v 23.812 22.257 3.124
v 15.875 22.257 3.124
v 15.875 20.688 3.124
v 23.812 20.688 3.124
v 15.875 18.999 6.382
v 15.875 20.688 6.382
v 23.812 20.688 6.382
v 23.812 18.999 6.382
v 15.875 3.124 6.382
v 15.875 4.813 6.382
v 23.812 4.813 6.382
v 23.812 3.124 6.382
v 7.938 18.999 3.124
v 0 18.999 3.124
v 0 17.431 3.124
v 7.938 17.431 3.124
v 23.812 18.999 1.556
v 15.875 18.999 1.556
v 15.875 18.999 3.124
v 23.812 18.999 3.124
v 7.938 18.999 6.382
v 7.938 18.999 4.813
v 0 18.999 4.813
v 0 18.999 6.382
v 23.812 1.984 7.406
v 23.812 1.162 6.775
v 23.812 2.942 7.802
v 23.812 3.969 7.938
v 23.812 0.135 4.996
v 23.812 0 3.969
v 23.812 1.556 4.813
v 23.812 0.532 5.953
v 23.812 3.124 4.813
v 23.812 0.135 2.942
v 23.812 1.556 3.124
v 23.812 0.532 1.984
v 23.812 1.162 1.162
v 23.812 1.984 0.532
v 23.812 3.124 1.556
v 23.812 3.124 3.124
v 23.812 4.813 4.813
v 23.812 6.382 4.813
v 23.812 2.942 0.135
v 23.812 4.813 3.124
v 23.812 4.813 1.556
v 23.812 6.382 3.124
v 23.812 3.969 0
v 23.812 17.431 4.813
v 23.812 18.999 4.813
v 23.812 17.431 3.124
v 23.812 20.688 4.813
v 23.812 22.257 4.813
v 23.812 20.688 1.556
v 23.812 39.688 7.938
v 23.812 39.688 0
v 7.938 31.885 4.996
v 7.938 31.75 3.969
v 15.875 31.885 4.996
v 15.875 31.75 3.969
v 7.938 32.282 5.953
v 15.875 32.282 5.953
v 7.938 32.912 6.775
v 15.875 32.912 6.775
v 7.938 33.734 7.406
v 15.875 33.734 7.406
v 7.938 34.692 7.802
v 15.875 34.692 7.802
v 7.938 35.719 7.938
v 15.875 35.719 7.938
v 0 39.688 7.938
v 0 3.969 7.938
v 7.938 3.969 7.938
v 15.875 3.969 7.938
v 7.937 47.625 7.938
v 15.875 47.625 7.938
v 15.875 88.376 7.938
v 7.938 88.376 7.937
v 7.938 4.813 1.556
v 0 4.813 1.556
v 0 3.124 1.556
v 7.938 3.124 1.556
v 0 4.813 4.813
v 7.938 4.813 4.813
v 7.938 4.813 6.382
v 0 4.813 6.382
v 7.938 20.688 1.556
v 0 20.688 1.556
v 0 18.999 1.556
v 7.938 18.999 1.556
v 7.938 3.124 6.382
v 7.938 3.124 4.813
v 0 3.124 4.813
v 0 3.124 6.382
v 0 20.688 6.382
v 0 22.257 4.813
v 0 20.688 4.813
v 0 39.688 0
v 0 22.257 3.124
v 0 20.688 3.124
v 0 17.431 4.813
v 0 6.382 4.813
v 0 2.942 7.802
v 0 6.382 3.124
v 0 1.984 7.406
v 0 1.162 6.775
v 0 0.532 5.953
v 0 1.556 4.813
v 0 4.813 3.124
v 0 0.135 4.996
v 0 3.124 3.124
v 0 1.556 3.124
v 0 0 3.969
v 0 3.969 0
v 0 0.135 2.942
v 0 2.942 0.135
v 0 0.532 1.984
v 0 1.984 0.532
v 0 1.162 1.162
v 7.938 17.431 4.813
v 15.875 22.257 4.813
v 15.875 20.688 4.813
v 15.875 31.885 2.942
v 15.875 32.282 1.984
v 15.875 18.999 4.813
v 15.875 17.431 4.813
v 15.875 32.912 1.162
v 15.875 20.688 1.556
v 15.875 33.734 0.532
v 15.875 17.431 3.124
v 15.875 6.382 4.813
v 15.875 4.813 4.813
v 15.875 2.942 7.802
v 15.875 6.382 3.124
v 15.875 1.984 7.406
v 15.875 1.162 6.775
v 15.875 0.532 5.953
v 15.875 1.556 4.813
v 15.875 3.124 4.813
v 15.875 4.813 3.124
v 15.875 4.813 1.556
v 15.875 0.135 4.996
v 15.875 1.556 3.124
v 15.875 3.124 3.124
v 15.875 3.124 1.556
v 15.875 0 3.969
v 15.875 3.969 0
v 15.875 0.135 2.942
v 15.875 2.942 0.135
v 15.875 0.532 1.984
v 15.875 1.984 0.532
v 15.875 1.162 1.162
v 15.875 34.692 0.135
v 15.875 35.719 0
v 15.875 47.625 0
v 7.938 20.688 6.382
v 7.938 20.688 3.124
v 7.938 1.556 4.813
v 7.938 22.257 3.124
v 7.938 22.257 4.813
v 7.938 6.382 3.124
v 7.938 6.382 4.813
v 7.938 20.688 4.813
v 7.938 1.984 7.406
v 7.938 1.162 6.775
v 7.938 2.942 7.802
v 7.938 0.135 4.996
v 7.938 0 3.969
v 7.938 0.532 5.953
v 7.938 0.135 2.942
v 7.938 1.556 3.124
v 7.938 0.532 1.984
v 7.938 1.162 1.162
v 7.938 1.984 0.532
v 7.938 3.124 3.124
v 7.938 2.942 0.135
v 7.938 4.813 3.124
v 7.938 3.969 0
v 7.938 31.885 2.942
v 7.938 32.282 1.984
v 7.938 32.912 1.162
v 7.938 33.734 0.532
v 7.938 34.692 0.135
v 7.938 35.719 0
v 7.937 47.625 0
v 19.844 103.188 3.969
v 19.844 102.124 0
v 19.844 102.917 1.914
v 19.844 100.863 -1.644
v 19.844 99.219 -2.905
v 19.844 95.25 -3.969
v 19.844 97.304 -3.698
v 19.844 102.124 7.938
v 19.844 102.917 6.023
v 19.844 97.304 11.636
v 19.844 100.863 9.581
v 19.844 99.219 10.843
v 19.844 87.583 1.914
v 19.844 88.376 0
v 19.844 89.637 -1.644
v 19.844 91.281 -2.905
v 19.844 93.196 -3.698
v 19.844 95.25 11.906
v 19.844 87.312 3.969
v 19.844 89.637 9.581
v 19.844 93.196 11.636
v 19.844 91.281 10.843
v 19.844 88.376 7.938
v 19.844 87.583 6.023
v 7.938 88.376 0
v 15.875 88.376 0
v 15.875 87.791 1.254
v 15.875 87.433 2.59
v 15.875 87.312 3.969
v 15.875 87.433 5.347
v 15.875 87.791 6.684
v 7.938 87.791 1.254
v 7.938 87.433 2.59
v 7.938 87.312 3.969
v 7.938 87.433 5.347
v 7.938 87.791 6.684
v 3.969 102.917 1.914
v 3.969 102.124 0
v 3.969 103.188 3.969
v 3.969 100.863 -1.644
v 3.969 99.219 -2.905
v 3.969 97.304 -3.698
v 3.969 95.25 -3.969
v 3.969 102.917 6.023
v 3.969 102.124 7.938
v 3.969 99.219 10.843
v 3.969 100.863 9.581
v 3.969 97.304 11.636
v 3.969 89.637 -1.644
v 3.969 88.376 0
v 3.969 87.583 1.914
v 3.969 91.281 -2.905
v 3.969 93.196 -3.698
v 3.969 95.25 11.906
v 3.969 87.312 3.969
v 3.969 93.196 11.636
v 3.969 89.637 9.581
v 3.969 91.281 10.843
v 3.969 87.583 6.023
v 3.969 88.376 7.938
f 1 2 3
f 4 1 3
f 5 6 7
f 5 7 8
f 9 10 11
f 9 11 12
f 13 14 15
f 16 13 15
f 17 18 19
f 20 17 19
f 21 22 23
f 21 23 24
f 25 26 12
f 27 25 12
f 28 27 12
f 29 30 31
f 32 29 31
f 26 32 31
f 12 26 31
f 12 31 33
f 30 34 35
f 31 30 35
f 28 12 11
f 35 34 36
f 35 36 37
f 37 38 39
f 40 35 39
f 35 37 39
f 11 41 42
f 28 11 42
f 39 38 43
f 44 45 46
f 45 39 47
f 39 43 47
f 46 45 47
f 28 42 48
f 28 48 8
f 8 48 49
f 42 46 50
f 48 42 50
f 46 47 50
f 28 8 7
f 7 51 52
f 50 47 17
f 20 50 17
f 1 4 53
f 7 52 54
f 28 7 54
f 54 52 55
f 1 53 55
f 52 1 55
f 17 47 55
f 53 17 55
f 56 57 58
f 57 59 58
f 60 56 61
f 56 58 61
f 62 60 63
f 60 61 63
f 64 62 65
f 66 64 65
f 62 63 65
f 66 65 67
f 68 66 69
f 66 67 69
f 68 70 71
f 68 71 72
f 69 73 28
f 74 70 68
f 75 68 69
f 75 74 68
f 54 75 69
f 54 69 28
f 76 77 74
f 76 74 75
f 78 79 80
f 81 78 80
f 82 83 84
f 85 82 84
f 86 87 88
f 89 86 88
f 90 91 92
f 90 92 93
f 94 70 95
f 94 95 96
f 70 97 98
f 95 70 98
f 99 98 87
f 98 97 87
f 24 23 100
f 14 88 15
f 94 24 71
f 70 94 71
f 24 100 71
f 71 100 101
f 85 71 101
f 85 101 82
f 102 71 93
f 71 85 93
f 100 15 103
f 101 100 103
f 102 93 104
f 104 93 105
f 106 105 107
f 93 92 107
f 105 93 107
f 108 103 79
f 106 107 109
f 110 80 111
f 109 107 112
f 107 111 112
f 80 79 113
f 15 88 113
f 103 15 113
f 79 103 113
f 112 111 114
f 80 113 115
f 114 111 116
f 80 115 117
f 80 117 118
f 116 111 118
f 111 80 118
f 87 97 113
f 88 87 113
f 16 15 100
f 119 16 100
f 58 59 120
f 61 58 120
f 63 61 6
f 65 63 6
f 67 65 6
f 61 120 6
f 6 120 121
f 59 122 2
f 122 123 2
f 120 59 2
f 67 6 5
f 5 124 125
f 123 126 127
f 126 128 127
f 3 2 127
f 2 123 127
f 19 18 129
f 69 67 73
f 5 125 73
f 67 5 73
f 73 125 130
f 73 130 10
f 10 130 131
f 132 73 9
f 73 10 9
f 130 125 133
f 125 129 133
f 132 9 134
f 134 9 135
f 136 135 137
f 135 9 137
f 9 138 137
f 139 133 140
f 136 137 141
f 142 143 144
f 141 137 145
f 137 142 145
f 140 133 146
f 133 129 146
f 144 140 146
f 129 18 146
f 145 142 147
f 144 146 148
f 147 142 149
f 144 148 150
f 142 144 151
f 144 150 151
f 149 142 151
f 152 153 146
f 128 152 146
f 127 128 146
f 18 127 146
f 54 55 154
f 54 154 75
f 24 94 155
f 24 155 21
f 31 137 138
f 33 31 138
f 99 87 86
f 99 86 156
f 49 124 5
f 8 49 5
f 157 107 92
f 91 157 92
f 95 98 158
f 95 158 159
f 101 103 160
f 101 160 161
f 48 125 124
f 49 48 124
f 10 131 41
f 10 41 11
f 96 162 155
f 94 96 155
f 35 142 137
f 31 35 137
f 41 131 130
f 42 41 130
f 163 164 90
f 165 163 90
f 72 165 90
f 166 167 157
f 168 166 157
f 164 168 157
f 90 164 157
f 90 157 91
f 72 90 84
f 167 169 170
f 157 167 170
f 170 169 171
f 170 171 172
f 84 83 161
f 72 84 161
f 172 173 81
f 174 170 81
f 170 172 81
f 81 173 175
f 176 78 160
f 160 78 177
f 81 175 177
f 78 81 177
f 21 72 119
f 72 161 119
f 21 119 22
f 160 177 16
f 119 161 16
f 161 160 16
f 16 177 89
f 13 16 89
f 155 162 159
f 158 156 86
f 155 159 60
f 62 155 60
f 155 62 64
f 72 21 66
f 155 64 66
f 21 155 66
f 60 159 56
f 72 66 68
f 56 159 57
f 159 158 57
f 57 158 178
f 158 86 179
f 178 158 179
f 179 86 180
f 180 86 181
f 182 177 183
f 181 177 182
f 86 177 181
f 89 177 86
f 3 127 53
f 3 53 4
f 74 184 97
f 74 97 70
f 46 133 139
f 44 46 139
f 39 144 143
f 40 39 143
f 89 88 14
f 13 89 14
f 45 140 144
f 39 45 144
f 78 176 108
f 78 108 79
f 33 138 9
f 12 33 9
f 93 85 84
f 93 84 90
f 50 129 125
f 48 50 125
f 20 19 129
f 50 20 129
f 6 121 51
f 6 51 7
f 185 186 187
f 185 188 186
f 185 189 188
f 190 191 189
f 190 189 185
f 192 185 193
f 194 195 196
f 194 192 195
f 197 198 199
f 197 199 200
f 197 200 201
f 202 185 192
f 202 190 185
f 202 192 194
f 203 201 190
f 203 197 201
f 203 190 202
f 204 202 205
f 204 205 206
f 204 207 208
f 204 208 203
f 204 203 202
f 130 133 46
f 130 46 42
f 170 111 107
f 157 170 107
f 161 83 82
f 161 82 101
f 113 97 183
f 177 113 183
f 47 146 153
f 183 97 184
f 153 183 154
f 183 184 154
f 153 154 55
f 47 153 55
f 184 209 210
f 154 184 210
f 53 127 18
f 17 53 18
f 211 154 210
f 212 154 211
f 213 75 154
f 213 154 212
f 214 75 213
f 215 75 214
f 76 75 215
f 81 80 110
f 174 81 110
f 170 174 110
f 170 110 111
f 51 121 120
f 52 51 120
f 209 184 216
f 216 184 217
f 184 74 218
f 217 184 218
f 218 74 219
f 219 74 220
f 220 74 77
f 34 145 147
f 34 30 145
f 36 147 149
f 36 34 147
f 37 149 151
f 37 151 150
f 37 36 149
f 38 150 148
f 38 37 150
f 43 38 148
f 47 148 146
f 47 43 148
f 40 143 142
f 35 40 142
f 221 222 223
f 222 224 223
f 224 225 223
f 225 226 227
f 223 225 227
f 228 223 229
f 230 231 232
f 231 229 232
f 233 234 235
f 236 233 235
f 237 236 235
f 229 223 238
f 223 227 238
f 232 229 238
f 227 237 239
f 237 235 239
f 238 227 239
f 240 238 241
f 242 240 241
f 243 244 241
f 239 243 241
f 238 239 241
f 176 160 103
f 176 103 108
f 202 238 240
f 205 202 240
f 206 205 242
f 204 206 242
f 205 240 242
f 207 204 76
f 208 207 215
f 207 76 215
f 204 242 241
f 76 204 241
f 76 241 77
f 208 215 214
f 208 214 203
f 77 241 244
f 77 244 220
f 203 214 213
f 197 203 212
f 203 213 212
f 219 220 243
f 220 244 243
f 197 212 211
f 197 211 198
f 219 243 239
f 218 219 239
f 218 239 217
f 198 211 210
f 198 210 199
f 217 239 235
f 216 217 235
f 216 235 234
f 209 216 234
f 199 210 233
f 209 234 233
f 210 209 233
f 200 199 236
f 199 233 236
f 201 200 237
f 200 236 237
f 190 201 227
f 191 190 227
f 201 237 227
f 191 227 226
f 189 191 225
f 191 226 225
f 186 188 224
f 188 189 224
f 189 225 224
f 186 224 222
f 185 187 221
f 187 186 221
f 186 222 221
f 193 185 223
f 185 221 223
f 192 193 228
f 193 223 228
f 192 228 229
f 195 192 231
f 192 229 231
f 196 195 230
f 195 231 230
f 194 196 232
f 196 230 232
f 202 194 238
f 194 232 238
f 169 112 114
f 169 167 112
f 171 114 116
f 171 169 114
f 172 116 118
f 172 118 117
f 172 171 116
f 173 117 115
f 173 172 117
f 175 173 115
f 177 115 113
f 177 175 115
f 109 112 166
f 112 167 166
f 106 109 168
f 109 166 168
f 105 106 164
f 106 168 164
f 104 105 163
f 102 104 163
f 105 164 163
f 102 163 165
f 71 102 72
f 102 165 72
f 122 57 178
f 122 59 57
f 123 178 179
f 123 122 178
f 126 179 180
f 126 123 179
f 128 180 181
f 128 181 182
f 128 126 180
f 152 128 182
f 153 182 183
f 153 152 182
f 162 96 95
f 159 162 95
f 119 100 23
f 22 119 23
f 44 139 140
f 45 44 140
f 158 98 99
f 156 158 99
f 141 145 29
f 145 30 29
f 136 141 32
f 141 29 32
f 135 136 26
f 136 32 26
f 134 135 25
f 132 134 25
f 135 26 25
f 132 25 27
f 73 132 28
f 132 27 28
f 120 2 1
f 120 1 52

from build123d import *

# Parameters (mm, degrees)
F1_DEPTH     = 7.9375
F2_R         = 3.96874
F3_W         = 1.56845
F3_H         = 1.6891
F3_W_2       = 1.6891
F3_H_2       = 1.56845
F4_DEPTH     = 130
F5_SIZE      = 7.93749
F6_W         = 15.875
F6_H         = 15.875
F7_DEPTH     = 15.875
F8_T1_DEPTH  = 55.5625
F8_T6_DEPTH  = 55.5625
F8_T12_DEPTH = 55.5625
F8_T18_DEPTH = 55.5625
F8_T25_DEPTH = 55.5625
F8_T31_DEPTH = 55.5625
F8_T37_DEPTH = 55.5625
F8_T43_DEPTH = 55.5625
F8_T49_DEPTH = 55.5625
F8_T56_DEPTH = 55.5625
F8_T62_DEPTH = 55.5625


# Not quite as in the source:
# - a fillet or chamfer that OpenCascade refuses, or shapes differently, is made with other operations: its cross-section is extruded or revolved along the edge and cut away or added
# - a fillet or chamfer is up to 0.001 mm smaller than in the source, because OpenCascade refuses the exact size
# - an extrude ends at something that could not be found from the text; its depth is read off the source's solid


with BuildPart() as f1:
    # F0 (on Top) → F1 (new body)
    with BuildSketch(Plane.XY):
        Polygon((0, 39.6875), (0, 0), (7.9375, 0), (7.9375, 31.75), (15.875, 31.75), (15.875, 0), (23.8125, 0), (23.8125, 39.6875), (15.875, 39.6875), (15.875, 87.3125), (7.9375, 87.3125), (7.9375, 39.6875), align=None)
    extrude(amount=F1_DEPTH)

    # F2 (radius 3.96875 in the source; OpenCascade refuses exactly that, so slightly less here)
    f2_edges = [f1.edges().sort_by_distance(p)[0] for p in [
        (3.96875, 0, 0),
        (3.96875, 0, 7.9375),
        (19.84375, 0, 7.9375),
        (19.84375, 0, 0),
        (11.90625, 31.75, 7.9375),
        (11.90625, 31.75, 0),
    ]]
    fillet(f2_edges, radius=F2_R)

    # F3 (on face) → F4 (cut, through all)
    with BuildSketch(Plane(origin=(0, 0, 0), x_dir=(0, -1, 0), z_dir=(-1, 0, 0))):
        with Locations((-2.339975, 3.96875)):
            Rectangle(F3_W, F3_H)
        with Locations((-3.96875, 2.339975)):
            Rectangle(F3_W_2, F3_H_2)
        with Locations((-3.96875, 3.96875)):
            Rectangle(F3_W_2, F3_H)
        with Locations((-5.597525, 3.96875)):
            Rectangle(F3_W, F3_H)
        with Locations((-3.96875, 5.597525)):
            Rectangle(F3_W_2, F3_H_2)
        with Locations((-19.84375, 2.339975)):
            Rectangle(F3_W_2, F3_H_2)
        with Locations((-21.472525, 3.96875)):
            Rectangle(F3_W, F3_H)
        with Locations((-19.84375, 3.96875)):
            Rectangle(F3_W_2, F3_H)
        with Locations((-18.214975, 3.96875)):
            Rectangle(F3_W, F3_H)
        with Locations((-19.84375, 5.597525)):
            Rectangle(F3_W_2, F3_H_2)
    extrude(amount=-F4_DEPTH, mode=Mode.SUBTRACT)

    # F5 (size 7.9375 in the source; OpenCascade refuses exactly that, so slightly less here)
    f5_edges = [f1.edges().sort_by_distance(p)[0] for p in [
        (7.9375, 39.6875, 3.96875),
        (15.875, 39.6875, 3.96875),
    ]]
    chamfer(f5_edges, length=F5_SIZE)

    # F6 (on face) → F7 (join)
    with BuildSketch(Plane(origin=(0, 87.3125, 0), x_dir=(-1, 0, 0), z_dir=(0, 1, 0))):
        with Locations((-11.90625, 3.96875)):
            Rectangle(F6_W, F6_H)
    extrude(amount=F7_DEPTH)

    # F8: fillet of radius 7.9375 on 4 edges, made by hand

    # F8_s2 → F8_t1 (cut)
    with BuildSketch(Plane.YZ.offset(-15.875)):
        with BuildLine():
            ThreePointArc((95.25, -3.96875), (100.8626600757, -1.6439100757), (103.1875, 3.96875))
            Line((103.1875, 3.96875), (103.1875, -3.96875))
            Line((103.1875, -3.96875), (95.25, -3.96875))
        make_face()
        with BuildLine():
            ThreePointArc((95.25, 11.90625), (100.8626600757, 9.5814100757), (103.1875, 3.96875))
            Line((103.1875, 3.96875), (103.1875, 11.90625))
            Line((103.1875, 11.90625), (95.25, 11.90625))
        make_face()
    extrude(amount=F8_T1_DEPTH, mode=Mode.SUBTRACT)


with BuildPart() as f8_tool4:
    # F8_s5 → F8_t6 (new body)
    with BuildSketch(Plane.YZ.offset(39.6875)):
        with BuildLine():
            ThreePointArc((95.25, -3.96875), (89.6373399243, -1.6439100757), (87.3125, 3.96875))
            Line((87.3125, 3.96875), (87.3125, -3.96875))
            Line((87.3125, -3.96875), (95.25, -3.96875))
        make_face()
    extrude(amount=-F8_T6_DEPTH)

    split(bisect_by=Plane.XY, keep=Keep.BOTTOM)

    split(bisect_by=Plane.YZ.offset(15.875), keep=Keep.TOP)


with BuildPart() as f1_1:
    add(f1.part)

    # F8_t3: cut F8_tool4
    add(f8_tool4.part, mode=Mode.SUBTRACT)


with BuildPart() as f8_tool10:
    # F8_s11 → F8_t12 (new body)
    with BuildSketch(Plane.YZ.offset(39.6875)):
        with BuildLine():
            ThreePointArc((95.25, -3.96875), (89.6373399243, -1.6439100757), (87.3125, 3.96875))
            Line((87.3125, 3.96875), (87.3125, -3.96875))
            Line((87.3125, -3.96875), (95.25, -3.96875))
        make_face()
    extrude(amount=-F8_T12_DEPTH)

    split(bisect_by=Plane.XY, keep=Keep.TOP)

    split(bisect_by=Plane.YZ.offset(15.875), keep=Keep.TOP)


with BuildPart() as f1_2:
    add(f1_1.part)

    # F8_t9: cut F8_tool10
    add(f8_tool10.part, mode=Mode.SUBTRACT)


with BuildPart() as f8_tool16:
    # F8_s17 → F8_t18 (new body)
    with BuildSketch(Plane.YZ.offset(39.6875)):
        with BuildLine():
            ThreePointArc((95.25, -3.96875), (89.6373399243, -1.6439100757), (87.3125, 3.96875))
            Line((87.3125, 3.96875), (87.3125, -3.96875))
            Line((87.3125, -3.96875), (95.25, -3.96875))
        make_face()
    extrude(amount=-F8_T18_DEPTH)

    split(bisect_by=Plane.XY, keep=Keep.BOTTOM)

    split(bisect_by=Plane.YZ.offset(7.9375), keep=Keep.TOP)

    split(bisect_by=Plane.YZ.offset(15.875), keep=Keep.BOTTOM)


with BuildPart() as f1_3:
    add(f1_2.part)

    # F8_t15: cut F8_tool16
    add(f8_tool16.part, mode=Mode.SUBTRACT)


with BuildPart() as f8_tool23:
    # F8_s24 → F8_t25 (new body)
    with BuildSketch(Plane.YZ.offset(39.6875)):
        with BuildLine():
            ThreePointArc((95.25, -3.96875), (89.6373399243, -1.6439100757), (87.3125, 3.96875))
            Line((87.3125, 3.96875), (87.3125, -3.96875))
            Line((87.3125, -3.96875), (95.25, -3.96875))
        make_face()
    extrude(amount=-F8_T25_DEPTH)

    split(bisect_by=Plane.XY, keep=Keep.BOTTOM)

    split(bisect_by=Plane.YZ.offset(7.9375), keep=Keep.BOTTOM)


with BuildPart() as f1_4:
    add(f1_3.part)

    # F8_t22: cut F8_tool23
    add(f8_tool23.part, mode=Mode.SUBTRACT)


with BuildPart() as f8_tool29:
    # F8_s30 → F8_t31 (new body)
    with BuildSketch(Plane.YZ.offset(39.6875)):
        with BuildLine():
            ThreePointArc((95.25, -3.96875), (89.6373399243, -1.6439100757), (87.3125, 3.96875))
            Line((87.3125, 3.96875), (87.3125, -3.96875))
            Line((87.3125, -3.96875), (95.25, -3.96875))
        make_face()
    extrude(amount=-F8_T31_DEPTH)

    split(bisect_by=Plane.XY, keep=Keep.TOP)

    split(bisect_by=Plane.YZ.offset(7.9375), keep=Keep.BOTTOM)


with BuildPart() as f1_5:
    add(f1_4.part)

    # F8_t28: cut F8_tool29
    add(f8_tool29.part, mode=Mode.SUBTRACT)


with BuildPart() as f8_tool35:
    # F8_s36 → F8_t37 (new body)
    with BuildSketch(Plane.YZ.offset(-15.875)):
        with BuildLine():
            ThreePointArc((95.25, 11.90625), (89.6373399243, 9.5814100757), (87.3125, 3.96875))
            Line((87.3125, 3.96875), (87.3125, 11.90625))
            Line((87.3125, 11.90625), (95.25, 11.90625))
        make_face()
    extrude(amount=F8_T37_DEPTH)

    split(bisect_by=Plane.YZ.offset(7.9375), keep=Keep.BOTTOM)

    split(bisect_by=Plane.XY.offset(7.9375), keep=Keep.TOP)


with BuildPart() as f1_6:
    add(f1_5.part)

    # F8_t34: cut F8_tool35
    add(f8_tool35.part, mode=Mode.SUBTRACT)


with BuildPart() as f8_tool41:
    # F8_s42 → F8_t43 (new body)
    with BuildSketch(Plane.YZ.offset(-15.875)):
        with BuildLine():
            ThreePointArc((95.25, 11.90625), (89.6373399243, 9.5814100757), (87.3125, 3.96875))
            Line((87.3125, 3.96875), (87.3125, 11.90625))
            Line((87.3125, 11.90625), (95.25, 11.90625))
        make_face()
    extrude(amount=F8_T43_DEPTH)

    split(bisect_by=Plane.YZ.offset(7.9375), keep=Keep.BOTTOM)

    split(bisect_by=Plane.XY.offset(7.9375), keep=Keep.BOTTOM)


with BuildPart() as f1_7:
    add(f1_6.part)

    # F8_t40: cut F8_tool41
    add(f8_tool41.part, mode=Mode.SUBTRACT)


with BuildPart() as f8_tool47:
    # F8_s48 → F8_t49 (new body)
    with BuildSketch(Plane.YZ.offset(-15.875)):
        with BuildLine():
            ThreePointArc((95.25, 11.90625), (89.6373399243, 9.5814100757), (87.3125, 3.96875))
            Line((87.3125, 3.96875), (87.3125, 11.90625))
            Line((87.3125, 11.90625), (95.25, 11.90625))
        make_face()
    extrude(amount=F8_T49_DEPTH)

    split(bisect_by=Plane.YZ.offset(7.9375), keep=Keep.TOP)

    split(bisect_by=Plane.XY.offset(7.9375), keep=Keep.TOP)

    split(bisect_by=Plane.YZ.offset(15.875), keep=Keep.BOTTOM)


with BuildPart() as f1_8:
    add(f1_7.part)

    # F8_t46: cut F8_tool47
    add(f8_tool47.part, mode=Mode.SUBTRACT)


with BuildPart() as f8_tool54:
    # F8_s55 → F8_t56 (new body)
    with BuildSketch(Plane.YZ.offset(-15.875)):
        with BuildLine():
            ThreePointArc((95.25, 11.90625), (89.6373399243, 9.5814100757), (87.3125, 3.96875))
            Line((87.3125, 3.96875), (87.3125, 11.90625))
            Line((87.3125, 11.90625), (95.25, 11.90625))
        make_face()
    extrude(amount=F8_T56_DEPTH)

    split(bisect_by=Plane.XY.offset(7.9375), keep=Keep.TOP)

    split(bisect_by=Plane.YZ.offset(15.875), keep=Keep.TOP)


with BuildPart() as f1_9:
    add(f1_8.part)

    # F8_t53: cut F8_tool54
    add(f8_tool54.part, mode=Mode.SUBTRACT)


with BuildPart() as f8_tool60:
    # F8_s61 → F8_t62 (new body)
    with BuildSketch(Plane.YZ.offset(-15.875)):
        with BuildLine():
            ThreePointArc((95.25, 11.90625), (89.6373399243, 9.5814100757), (87.3125, 3.96875))
            Line((87.3125, 3.96875), (87.3125, 11.90625))
            Line((87.3125, 11.90625), (95.25, 11.90625))
        make_face()
    extrude(amount=F8_T62_DEPTH)

    split(bisect_by=Plane.XY.offset(7.9375), keep=Keep.BOTTOM)

    split(bisect_by=Plane.YZ.offset(15.875), keep=Keep.TOP)


with BuildPart() as f1_10:
    add(f1_9.part)

    # F8_t59: cut F8_tool60
    add(f8_tool60.part, mode=Mode.SUBTRACT)


solid = f1_10.part
